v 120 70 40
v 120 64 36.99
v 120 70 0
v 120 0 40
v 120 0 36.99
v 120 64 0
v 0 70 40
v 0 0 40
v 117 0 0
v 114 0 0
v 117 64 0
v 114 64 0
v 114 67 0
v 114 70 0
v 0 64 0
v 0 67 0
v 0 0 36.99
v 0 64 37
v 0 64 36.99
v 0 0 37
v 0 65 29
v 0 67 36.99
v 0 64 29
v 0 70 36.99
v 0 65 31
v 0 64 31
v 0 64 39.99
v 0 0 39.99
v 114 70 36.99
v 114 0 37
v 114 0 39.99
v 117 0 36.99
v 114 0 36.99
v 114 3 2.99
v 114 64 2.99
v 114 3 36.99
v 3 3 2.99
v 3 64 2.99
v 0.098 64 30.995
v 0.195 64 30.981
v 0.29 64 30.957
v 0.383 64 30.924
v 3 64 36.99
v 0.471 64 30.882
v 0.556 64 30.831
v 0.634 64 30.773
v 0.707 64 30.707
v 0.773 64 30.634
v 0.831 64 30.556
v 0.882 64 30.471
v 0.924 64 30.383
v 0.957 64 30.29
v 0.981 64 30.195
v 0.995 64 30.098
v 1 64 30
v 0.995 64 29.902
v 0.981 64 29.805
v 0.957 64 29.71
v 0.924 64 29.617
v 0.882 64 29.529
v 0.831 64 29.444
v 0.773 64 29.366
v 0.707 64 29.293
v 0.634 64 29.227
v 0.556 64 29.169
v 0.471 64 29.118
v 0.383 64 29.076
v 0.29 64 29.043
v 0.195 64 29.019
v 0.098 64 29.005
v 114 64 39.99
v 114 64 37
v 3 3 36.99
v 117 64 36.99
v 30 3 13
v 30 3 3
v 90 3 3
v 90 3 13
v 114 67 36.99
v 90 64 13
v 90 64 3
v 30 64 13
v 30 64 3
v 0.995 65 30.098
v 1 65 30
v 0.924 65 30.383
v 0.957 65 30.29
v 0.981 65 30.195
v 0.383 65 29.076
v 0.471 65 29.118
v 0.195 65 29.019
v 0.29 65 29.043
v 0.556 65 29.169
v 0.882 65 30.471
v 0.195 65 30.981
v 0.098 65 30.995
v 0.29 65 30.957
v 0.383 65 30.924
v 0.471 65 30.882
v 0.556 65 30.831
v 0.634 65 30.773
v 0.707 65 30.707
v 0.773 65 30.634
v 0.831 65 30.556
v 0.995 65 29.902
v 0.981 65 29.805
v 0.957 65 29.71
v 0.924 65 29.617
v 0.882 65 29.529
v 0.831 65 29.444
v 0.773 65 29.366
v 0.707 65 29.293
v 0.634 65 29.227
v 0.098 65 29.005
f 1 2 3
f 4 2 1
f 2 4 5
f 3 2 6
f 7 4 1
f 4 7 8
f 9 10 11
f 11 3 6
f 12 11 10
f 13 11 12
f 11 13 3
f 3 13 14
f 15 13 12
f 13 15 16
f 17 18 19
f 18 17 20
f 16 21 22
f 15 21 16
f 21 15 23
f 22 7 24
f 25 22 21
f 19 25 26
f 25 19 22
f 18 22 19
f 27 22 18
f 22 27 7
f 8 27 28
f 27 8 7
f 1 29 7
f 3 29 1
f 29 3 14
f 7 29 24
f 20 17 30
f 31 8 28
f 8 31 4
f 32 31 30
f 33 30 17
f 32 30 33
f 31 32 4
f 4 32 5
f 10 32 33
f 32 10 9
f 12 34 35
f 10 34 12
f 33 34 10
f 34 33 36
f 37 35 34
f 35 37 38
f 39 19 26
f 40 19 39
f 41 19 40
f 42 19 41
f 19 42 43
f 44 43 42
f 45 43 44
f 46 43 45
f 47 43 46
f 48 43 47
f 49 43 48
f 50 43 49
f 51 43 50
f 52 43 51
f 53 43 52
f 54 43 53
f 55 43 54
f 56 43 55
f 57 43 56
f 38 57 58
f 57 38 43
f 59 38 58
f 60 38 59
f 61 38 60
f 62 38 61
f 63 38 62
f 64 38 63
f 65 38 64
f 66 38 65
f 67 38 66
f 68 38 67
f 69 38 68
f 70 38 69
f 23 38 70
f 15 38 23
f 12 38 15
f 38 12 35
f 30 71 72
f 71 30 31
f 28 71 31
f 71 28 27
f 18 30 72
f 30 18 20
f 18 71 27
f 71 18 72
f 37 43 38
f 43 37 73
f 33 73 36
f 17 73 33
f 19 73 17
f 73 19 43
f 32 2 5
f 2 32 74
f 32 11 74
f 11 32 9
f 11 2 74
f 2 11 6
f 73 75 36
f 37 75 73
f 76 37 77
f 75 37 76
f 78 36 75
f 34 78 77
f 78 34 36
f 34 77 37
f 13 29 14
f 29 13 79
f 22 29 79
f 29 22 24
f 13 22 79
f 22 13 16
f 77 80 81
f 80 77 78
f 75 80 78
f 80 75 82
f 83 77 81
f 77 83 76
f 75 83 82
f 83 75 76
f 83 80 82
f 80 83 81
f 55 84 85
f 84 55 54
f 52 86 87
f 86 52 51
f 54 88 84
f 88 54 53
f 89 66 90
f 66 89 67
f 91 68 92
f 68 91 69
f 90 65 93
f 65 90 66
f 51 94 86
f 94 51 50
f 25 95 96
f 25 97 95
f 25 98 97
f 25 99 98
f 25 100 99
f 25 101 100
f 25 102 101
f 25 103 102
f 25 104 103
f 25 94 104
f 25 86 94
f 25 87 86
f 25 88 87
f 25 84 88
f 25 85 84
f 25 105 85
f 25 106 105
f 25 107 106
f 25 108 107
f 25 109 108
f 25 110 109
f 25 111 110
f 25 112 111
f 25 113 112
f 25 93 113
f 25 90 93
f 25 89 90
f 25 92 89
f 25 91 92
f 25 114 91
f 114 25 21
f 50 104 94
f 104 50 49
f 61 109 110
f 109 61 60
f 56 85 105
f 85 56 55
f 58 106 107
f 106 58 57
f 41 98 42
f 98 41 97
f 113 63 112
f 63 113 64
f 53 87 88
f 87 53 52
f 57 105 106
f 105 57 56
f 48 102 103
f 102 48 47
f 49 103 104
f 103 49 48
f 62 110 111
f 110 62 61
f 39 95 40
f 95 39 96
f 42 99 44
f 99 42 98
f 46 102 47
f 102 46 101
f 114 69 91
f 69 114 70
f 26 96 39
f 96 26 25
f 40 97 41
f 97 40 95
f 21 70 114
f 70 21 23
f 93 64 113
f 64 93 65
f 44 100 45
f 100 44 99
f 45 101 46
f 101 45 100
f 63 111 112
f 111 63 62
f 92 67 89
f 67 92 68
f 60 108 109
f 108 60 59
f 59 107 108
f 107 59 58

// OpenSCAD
// Buffer Tank for Mini Horizontal Gel Electrophoresis
// Units: millimetres

// Outer Dimensions
$outer_x = 120;
$outer_y = 70;
$outer_z = 40;

// Wall and Floor Thickness
$wall_thick = 3;
$floor_thick = 3;

// Platform Dimensions
$platform_len = 60;      // Length in X
$platform_width = $outer_y - 2 * $wall_thick; // Matches inner width
$platform_height = 10;   // Height above inner floor
$platform_z_bottom = $floor_thick; // Z position of platform bottom
$platform_z_top = $platform_z_bottom + $platform_height;

// Hole Dimensions
$hole_dia = 2;
$hole_y = 0;
$hole_z = 30;

// Rendering settings
$fn = 64;

// Calculate Inner Dimensions
$inner_x = $outer_x - 2 * $wall_thick;
$inner_y = $outer_y - 2 * $wall_thick;
$inner_z = $outer_z - $floor_thick;

// Build the tank
difference() {
    // 1. Create the main outer block
    cube([
        $outer_x, 
        $outer_y, 
        $outer_z
    ]);

    // 2. Cut out the bottom floor
    translate([0, 0, 0]) {
        cube([
            $inner_x, 
            $inner_y, 
            $floor_thick - 0.01 // Slightly less than floor thickness
        ]);
    }

    // 3. Cut out the top opening (open-top tank)
    // The opening is at the very top, extending down to the top of the floor
    translate([0, 0, $outer_z - $floor_thick]) {
        cube([
            $inner_x, 
            $inner_y, 
            $floor_thick - 0.01 // Cut down just past the floor level
        ]);
    }

    // 4. Cut out the side walls to create the hollow cavity
    // We define the cavity volume and subtract it from the block.
    // Cavity bounds:
    // X: $wall_thick to $outer_x - $wall_thick
    // Y: $wall_thick to $outer_y - $wall_thick
    // Z: $floor_thick to $outer_z - $floor_thick
    
    // Left Wall Cut
    translate([0, 0, 0]) {
        cube([
            $wall_thick, 
            $inner_y, 
            $inner_z - 0.01
        ]);
    }
    // Right Wall Cut
    translate([$outer_x - $wall_thick, 0, 0]) {
        cube([
            $wall_thick, 
            $inner_y, 
            $inner_z - 0.01
        ]);
    }
    // Front Wall Cut
    translate([0, 0, 0]) {
        cube([
            $inner_x, 
            $wall_thick, 
            $inner_z - 0.01
        ]);
    }
    // Back Wall Cut
    translate([0, $outer_y - $wall_thick, 0]) {
        cube([
            $inner_x, 
            $wall_thick, 
            $inner_z - 0.01
        ]);
    }

    // 5. Add the solid raised platform
    // Position: Centered in X, spanning full inner width Y
    translate([
        ($outer_x - $platform_len) / 2, 
        0, 
        $platform_z_bottom
    ]) {
        cube([
            $platform_len, 
            $platform_width, 
            $platform_height
        ]);
    }

    // 6. Drill electrode holes
    // Hole position: y = $hole_y, z = $hole_z
    // Axis: X (horizontal)
    // Length: Must span the entire tank width in X to pass through both end walls.
    // We place the cylinder centered at the hole coordinates.
    // The cylinder axis is X, so we rotate 90 deg around Y to align the cylinder's Z-axis with X.
    // Wait, standard cylinder in OpenSCAD is along Z. To make it along X, rotate 90 around Y.
    // Position: y=$hole_y, z=$hole_z.
    // We need to translate the cylinder so its center is at (0, $hole_y, $hole_z) in world space.
    // Since the cylinder is along X, its center X is 0.
    
    translate([0, $hole_y, $hole_z]) {
        rotate([90, 0, 0]) {
            cylinder(
                h = $outer_x + 10, // Extend slightly past ends to ensure clean cut
                r = $hole_dia / 2,
                center = true
            );
        }
    }
}
